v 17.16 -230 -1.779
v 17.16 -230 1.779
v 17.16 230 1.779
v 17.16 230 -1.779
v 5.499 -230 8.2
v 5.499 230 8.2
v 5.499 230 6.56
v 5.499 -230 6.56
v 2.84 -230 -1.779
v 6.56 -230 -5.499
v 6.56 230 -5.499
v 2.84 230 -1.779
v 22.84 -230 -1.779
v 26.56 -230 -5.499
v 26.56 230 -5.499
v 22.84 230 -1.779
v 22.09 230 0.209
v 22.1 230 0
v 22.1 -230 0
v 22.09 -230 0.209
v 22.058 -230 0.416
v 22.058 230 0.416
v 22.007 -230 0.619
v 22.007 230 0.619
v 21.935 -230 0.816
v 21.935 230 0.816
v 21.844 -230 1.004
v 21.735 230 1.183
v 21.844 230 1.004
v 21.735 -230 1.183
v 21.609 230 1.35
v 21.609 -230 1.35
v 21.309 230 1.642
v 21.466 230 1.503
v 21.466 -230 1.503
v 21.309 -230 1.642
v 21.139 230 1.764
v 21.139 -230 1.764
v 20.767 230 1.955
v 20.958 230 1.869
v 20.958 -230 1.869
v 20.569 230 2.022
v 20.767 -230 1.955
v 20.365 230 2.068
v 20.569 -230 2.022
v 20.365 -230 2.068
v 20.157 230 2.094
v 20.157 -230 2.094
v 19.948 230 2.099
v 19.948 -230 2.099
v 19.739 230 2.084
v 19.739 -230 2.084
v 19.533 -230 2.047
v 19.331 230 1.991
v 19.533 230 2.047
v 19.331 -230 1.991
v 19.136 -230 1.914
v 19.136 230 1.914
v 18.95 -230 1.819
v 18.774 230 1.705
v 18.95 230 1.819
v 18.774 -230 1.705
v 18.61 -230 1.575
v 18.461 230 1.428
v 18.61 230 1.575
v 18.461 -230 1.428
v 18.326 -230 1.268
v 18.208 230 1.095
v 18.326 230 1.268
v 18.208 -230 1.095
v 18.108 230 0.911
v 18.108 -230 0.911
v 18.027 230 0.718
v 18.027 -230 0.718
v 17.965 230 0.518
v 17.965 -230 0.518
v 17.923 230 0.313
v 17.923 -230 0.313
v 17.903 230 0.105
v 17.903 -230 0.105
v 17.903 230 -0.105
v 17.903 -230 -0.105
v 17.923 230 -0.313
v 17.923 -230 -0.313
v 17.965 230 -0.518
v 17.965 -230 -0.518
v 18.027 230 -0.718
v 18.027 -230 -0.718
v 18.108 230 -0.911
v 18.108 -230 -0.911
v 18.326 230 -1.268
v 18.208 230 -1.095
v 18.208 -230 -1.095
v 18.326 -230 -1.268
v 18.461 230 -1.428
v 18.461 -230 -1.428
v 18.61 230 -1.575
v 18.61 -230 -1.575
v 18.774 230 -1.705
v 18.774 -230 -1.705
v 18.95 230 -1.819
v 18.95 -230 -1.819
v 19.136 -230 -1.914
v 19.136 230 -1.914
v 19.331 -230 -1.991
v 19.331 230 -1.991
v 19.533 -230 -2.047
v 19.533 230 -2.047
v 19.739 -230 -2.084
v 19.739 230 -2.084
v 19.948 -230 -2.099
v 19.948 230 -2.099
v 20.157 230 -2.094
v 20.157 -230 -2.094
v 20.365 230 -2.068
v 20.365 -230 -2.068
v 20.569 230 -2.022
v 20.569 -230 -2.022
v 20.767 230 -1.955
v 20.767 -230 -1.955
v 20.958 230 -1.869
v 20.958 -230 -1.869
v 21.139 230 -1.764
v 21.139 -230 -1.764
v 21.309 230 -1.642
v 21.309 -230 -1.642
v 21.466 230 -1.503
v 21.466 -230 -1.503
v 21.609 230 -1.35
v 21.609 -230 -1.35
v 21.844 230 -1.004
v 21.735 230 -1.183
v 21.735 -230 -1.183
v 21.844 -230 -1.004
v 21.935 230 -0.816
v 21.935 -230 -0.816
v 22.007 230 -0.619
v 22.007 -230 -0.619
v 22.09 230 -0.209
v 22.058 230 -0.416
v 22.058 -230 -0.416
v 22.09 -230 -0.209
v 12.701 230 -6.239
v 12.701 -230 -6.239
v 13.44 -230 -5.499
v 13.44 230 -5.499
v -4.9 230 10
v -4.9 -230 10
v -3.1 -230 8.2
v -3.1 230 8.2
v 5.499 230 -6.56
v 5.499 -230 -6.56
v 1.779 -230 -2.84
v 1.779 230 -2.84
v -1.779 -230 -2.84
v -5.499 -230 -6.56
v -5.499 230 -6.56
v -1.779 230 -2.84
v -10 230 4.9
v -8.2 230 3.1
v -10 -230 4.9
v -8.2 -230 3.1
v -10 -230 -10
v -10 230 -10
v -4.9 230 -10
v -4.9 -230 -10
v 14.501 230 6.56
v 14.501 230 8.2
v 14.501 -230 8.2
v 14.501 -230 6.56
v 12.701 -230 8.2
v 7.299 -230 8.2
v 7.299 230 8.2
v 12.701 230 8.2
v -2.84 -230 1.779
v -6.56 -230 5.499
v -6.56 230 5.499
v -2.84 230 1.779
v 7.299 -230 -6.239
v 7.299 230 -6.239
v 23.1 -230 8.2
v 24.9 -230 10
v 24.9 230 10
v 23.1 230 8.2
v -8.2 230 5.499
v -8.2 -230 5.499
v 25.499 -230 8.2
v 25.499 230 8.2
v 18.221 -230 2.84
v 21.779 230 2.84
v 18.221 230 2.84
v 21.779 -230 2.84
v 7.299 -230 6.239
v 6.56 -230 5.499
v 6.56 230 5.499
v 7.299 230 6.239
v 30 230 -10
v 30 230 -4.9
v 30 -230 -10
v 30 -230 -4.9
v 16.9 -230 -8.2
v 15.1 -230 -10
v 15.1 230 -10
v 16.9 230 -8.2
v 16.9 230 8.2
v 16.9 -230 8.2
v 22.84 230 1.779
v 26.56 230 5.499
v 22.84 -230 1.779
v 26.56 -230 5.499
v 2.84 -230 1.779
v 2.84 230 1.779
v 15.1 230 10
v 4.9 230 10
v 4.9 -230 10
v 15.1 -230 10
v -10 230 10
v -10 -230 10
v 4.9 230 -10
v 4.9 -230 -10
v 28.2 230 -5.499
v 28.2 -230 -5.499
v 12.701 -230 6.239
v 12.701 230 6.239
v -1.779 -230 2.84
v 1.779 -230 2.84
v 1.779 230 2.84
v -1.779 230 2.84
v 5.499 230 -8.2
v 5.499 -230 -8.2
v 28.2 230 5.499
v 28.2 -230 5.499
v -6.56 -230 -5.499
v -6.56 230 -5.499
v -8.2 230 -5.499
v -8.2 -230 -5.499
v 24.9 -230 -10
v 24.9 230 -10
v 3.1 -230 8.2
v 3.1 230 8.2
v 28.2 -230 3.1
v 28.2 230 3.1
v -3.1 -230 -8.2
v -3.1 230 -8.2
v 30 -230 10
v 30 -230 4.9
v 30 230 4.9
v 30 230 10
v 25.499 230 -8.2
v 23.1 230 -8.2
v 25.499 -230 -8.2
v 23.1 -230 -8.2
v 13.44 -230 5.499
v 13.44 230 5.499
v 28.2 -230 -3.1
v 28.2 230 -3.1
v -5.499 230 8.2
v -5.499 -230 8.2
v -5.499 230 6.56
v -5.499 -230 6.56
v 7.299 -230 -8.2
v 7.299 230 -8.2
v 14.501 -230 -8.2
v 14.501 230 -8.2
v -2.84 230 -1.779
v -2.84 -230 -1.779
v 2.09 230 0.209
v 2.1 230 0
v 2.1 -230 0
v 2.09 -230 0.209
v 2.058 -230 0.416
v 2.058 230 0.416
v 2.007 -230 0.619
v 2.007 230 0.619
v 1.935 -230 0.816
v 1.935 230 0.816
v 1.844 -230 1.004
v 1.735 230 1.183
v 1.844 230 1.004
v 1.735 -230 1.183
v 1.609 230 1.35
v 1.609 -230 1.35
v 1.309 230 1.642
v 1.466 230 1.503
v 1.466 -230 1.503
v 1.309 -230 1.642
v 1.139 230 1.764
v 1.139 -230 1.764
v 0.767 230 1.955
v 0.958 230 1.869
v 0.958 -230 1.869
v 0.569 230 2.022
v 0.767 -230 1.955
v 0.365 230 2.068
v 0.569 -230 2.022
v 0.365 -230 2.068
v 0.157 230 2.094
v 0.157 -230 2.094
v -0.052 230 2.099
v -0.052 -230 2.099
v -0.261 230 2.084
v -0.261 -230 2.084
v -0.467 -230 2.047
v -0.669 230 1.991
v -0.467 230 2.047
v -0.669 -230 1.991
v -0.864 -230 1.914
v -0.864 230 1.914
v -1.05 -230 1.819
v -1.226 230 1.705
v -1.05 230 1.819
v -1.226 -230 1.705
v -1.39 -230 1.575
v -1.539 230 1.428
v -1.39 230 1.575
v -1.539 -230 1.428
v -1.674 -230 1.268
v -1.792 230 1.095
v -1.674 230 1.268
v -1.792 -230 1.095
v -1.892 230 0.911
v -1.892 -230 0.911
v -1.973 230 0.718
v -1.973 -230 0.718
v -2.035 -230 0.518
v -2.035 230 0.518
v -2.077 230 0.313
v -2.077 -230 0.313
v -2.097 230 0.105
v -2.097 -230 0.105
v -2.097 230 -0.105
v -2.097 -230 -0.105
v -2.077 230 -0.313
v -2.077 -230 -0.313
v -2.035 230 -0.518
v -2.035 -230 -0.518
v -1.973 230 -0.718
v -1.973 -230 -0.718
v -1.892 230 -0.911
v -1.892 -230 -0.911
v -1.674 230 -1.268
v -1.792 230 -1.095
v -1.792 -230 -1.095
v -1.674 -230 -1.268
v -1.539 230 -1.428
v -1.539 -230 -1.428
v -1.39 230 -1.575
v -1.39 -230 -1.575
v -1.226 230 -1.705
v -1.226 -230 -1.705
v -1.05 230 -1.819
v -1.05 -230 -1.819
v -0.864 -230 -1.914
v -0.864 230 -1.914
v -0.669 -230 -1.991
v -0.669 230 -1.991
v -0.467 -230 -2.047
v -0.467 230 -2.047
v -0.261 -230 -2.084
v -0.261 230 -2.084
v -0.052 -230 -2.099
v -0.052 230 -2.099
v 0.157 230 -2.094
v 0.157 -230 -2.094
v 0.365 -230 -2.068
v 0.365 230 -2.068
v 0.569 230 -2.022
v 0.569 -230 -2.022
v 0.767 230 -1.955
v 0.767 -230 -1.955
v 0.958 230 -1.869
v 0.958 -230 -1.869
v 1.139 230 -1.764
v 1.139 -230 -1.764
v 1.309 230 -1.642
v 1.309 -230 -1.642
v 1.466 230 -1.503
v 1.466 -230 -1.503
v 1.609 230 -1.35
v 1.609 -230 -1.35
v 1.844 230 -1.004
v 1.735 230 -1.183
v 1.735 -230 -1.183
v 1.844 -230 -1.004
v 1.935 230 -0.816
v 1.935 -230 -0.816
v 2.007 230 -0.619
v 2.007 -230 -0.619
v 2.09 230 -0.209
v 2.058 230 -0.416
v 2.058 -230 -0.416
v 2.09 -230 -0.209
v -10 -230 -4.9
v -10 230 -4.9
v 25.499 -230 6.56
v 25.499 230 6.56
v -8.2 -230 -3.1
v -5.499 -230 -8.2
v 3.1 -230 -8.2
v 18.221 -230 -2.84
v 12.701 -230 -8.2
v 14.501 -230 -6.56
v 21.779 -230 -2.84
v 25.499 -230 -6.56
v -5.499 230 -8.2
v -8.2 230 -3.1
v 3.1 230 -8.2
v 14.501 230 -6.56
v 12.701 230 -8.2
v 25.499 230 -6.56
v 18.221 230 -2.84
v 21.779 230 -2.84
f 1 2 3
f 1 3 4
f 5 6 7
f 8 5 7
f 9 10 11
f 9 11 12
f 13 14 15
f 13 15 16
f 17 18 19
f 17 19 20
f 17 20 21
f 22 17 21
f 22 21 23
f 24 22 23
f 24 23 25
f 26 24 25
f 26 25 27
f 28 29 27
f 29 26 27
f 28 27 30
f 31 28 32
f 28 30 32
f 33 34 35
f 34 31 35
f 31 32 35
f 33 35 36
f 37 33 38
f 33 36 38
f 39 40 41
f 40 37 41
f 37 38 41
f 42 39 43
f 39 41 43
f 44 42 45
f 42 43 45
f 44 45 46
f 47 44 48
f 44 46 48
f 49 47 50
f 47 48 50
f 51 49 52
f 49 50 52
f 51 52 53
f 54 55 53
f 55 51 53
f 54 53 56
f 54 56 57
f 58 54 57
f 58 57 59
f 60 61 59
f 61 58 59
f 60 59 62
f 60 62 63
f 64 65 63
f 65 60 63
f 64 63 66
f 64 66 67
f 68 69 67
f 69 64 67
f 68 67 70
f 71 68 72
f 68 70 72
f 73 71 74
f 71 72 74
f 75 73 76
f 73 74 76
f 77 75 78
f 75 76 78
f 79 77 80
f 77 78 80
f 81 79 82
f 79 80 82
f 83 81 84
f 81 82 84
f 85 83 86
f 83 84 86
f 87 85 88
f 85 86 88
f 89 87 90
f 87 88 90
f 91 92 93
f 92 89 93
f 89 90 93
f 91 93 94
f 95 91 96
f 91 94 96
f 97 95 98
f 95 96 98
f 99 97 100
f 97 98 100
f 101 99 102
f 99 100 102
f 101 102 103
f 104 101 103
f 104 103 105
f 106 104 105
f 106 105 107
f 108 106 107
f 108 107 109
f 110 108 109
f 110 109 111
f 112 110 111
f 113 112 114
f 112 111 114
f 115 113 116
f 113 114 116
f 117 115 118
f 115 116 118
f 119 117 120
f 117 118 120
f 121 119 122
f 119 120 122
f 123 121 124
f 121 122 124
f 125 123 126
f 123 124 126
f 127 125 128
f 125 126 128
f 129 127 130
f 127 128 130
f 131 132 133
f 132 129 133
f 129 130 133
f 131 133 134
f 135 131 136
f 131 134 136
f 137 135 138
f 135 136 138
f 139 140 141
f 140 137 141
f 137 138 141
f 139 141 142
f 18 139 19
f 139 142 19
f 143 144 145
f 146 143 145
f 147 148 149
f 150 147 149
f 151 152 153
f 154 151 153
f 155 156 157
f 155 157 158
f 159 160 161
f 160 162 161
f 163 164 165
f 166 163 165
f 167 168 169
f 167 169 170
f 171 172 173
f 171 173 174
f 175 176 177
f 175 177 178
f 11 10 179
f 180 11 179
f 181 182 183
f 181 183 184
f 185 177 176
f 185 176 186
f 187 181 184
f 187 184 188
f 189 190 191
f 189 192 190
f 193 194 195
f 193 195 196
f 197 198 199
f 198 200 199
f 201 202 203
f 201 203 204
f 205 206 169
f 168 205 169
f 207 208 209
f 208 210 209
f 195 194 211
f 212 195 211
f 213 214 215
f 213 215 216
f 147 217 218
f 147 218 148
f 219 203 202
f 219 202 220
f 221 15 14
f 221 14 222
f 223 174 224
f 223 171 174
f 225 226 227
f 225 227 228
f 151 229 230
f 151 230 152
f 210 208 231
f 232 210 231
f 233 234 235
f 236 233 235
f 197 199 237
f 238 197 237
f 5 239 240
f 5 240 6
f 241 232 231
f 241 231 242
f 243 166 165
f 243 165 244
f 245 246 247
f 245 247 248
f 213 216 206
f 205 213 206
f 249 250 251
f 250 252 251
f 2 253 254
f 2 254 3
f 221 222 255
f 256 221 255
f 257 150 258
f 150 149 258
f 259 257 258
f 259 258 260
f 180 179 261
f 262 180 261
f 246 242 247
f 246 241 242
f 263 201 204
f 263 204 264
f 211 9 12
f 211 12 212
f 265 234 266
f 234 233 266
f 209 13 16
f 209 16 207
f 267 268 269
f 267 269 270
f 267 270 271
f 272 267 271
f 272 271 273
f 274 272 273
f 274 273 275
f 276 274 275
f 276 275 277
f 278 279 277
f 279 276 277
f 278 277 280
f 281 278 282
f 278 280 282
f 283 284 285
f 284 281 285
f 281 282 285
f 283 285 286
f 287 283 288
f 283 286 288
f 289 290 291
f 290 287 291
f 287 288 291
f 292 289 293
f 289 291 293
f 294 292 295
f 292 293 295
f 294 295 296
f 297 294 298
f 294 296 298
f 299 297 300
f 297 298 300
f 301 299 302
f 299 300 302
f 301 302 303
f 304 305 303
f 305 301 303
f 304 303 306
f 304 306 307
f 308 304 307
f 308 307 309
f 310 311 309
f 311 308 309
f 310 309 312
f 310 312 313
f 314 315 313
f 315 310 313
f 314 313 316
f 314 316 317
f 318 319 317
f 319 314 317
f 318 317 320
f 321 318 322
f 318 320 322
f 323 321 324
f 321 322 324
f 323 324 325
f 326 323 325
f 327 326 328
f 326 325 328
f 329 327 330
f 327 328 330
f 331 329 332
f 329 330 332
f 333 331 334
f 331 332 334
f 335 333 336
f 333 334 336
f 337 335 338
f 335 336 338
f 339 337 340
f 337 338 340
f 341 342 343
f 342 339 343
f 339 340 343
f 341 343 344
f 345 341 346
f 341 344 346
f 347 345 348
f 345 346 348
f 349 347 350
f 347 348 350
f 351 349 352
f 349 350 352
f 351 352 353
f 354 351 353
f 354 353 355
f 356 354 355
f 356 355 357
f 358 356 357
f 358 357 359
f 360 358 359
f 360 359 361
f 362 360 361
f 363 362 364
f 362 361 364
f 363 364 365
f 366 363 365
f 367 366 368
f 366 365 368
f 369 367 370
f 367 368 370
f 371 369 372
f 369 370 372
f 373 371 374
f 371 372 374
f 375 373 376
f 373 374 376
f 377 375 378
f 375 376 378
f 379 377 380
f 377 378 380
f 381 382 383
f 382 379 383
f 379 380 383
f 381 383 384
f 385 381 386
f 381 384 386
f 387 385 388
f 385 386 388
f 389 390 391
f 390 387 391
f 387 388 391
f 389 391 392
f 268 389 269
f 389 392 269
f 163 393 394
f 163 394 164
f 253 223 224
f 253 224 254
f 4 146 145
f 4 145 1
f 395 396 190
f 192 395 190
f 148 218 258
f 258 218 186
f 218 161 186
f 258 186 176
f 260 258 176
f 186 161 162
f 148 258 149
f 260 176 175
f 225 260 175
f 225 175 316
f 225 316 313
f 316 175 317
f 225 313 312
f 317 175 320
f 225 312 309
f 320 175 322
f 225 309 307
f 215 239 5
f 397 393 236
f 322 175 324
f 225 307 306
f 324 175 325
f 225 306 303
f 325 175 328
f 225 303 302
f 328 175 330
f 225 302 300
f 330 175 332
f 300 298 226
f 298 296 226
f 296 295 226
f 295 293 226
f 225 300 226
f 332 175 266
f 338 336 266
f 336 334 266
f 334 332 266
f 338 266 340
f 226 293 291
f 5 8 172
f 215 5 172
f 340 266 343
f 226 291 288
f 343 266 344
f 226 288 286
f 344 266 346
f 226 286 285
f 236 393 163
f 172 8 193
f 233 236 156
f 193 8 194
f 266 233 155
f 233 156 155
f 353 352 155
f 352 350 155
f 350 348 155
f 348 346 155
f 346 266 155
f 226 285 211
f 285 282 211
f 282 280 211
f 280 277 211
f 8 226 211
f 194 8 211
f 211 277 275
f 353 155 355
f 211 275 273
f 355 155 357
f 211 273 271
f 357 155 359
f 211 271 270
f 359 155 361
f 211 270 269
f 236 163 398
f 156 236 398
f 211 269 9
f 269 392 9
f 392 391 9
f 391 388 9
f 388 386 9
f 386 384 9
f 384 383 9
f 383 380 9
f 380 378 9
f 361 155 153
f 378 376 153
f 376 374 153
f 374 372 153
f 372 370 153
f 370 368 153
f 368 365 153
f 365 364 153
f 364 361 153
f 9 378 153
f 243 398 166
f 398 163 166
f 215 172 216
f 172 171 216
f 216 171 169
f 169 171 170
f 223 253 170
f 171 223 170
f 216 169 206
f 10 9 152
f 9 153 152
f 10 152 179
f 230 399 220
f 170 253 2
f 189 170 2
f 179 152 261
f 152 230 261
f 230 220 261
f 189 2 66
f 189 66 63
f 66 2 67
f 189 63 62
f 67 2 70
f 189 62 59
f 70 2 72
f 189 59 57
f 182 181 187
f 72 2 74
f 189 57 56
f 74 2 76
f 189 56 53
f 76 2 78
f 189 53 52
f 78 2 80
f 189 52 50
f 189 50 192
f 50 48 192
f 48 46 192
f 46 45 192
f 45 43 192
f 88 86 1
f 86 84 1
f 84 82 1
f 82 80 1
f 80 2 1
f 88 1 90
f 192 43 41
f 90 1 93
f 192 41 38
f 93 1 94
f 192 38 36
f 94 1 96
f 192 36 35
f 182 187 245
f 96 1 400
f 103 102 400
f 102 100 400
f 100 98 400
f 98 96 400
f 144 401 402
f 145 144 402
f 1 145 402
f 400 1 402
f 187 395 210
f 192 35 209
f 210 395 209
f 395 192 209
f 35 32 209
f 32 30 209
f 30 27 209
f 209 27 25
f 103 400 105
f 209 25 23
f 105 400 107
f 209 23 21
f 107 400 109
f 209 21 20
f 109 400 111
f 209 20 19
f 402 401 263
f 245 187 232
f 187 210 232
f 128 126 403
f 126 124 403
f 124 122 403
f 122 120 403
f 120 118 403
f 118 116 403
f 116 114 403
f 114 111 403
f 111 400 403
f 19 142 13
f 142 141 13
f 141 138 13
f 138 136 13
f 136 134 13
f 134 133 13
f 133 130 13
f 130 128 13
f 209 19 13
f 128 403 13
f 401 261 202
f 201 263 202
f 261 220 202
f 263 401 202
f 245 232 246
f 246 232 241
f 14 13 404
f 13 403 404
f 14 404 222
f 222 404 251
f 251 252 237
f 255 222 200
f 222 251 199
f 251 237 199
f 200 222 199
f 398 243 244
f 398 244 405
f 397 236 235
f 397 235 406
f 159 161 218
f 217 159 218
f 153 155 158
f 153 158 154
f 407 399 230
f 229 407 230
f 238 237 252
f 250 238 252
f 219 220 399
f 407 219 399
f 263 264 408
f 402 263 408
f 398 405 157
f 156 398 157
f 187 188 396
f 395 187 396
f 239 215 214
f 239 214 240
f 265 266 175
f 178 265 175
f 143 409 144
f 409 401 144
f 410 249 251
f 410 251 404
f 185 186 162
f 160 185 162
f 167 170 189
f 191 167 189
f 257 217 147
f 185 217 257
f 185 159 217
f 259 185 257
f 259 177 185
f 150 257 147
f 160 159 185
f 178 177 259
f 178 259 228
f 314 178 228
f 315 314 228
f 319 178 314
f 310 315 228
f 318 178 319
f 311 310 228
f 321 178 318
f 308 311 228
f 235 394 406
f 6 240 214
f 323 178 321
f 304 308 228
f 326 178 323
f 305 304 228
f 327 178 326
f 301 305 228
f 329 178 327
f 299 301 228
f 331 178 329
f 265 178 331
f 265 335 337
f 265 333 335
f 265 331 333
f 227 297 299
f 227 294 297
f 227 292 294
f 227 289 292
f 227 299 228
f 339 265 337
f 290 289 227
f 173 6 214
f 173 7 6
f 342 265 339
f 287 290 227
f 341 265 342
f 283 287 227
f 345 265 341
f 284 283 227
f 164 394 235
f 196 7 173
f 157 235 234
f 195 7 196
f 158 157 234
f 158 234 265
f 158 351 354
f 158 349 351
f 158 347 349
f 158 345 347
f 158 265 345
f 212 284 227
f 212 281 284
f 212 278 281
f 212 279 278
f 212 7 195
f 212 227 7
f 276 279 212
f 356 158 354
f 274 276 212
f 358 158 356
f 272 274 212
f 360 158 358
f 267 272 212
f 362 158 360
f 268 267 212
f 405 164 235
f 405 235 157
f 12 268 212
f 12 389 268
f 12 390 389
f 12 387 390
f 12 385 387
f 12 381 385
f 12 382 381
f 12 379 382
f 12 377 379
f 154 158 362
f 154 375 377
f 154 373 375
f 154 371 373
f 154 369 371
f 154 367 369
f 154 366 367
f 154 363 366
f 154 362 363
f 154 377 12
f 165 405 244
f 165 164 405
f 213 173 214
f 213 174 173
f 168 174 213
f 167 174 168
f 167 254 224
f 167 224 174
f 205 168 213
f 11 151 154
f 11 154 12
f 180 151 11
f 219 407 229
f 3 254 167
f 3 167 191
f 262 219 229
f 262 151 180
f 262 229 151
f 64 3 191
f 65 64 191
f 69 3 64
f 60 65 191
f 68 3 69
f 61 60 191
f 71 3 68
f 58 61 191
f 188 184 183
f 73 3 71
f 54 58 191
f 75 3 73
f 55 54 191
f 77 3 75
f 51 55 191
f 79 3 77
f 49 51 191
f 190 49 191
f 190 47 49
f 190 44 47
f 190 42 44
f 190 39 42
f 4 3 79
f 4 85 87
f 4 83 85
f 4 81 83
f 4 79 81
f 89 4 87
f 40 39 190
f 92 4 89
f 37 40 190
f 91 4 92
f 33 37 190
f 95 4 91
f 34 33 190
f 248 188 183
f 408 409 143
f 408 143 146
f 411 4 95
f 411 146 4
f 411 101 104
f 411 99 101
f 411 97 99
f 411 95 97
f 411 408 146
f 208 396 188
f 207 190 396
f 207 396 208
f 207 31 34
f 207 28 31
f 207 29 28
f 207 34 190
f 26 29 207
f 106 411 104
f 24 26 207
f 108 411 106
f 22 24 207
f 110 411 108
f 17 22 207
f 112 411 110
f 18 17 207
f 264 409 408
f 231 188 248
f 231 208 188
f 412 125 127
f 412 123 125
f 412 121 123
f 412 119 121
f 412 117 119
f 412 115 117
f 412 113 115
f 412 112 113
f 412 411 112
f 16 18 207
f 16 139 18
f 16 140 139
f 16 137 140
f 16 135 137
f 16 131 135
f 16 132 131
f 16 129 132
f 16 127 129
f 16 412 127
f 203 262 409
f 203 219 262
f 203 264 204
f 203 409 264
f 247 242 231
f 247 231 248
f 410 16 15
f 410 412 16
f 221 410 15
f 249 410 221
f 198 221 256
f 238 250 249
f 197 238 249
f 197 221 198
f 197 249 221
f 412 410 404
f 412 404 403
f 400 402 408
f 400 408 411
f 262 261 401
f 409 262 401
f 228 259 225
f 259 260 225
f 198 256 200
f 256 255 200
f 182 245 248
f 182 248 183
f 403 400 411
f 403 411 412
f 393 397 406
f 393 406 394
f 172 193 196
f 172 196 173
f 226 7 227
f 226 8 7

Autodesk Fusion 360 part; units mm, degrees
sketch "Sketch1" plane through (0, 0, 0) normal (0, 1, 0) x (1, 0, 0)
  circle A0 centre (0, 0) radius 2.1
  line L0 (-6.56, 5.4993) -> (-8.2, 5.4993)
  line L1 (-8.2, 5.4993) -> (-8.2, 3.1)
  line L2 (-8.2, 3.1) -> (-10, 4.9)
  line L3 (-10, 4.9) -> (-10, 10)
  line L4 (-10, 10) -> (-4.9, 10)
  line L5 (-4.9, 10) -> (-3.1, 8.2)
  line L6 (-3.1, 8.2) -> (-5.4993, 8.2)
  line L7 (-5.4993, 8.2) -> (-5.4993, 6.56)
  line L8 (-5.4993, 6.56) -> (-1.7793, 2.84)
  line L9 (-6.56, 5.4993) -> (-2.84, 1.7793)
  line L10 (0, 0) -> (-10, 10) construction
  line L11 (0, 0) -> (0, 5) construction
  line L12 (0, 0) -> (-5, 0) construction
  line L13 (-2.84, 1.7793) -> (-2.84, 0)
  line L14 (-1.7793, 2.84) -> (0, 2.84)
  line L15 (-8.2, -3.1) -> (-10, -4.9)
  line L16 (-6.56, -5.4993) -> (-8.2, -5.4993)
  line L17 (-10, -4.9) -> (-10, -10)
  line L18 (-4.9, -10) -> (-3.1, -8.2)
  line L19 (-5.4993, -6.56) -> (-1.7793, -2.84)
  line L20 (-6.56, -5.4993) -> (-2.84, -1.7793)
  line L21 (-1.7793, -2.84) -> (0, -2.84)
  line L22 (-3.1, -8.2) -> (-5.4993, -8.2)
  line L23 (-8.2, -5.4993) -> (-8.2, -3.1)
  line L24 (-10, -10) -> (-4.9, -10)
  line L25 (-5.4993, -8.2) -> (-5.4993, -6.56)
  line L26 (-2.84, -1.7793) -> (-2.84, 0)
  line L27 (4.9, 10) -> (3.1, 8.2)
  line L28 (2.84, -1.7793) -> (2.84, 0)
  line L29 (6.56, -5.4993) -> (2.84, -1.7793)
  line L30 (1.7793, 2.84) -> (0, 2.84)
  line L31 (5.4993, -8.2) -> (5.4993, -6.56)
  line L32 (5.4993, -6.56) -> (1.7793, -2.84)
  line L33 (10, 10) -> (4.9, 10)
  line L34 (2.84, 1.7793) -> (2.84, 0)
  line L35 (3.1, 8.2) -> (5.4993, 8.2)
  line L36 (10, -10) -> (4.9, -10)
  line L37 (1.7793, -2.84) -> (0, -2.84)
  line L38 (5.4993, 6.56) -> (1.7793, 2.84)
  line L39 (4.9, -10) -> (3.1, -8.2)
  line L40 (6.56, 5.4993) -> (2.84, 1.7793)
  line L41 (5.4993, 8.2) -> (5.4993, 6.56)
  line L42 (3.1, -8.2) -> (5.4993, -8.2)
  line L43 (10, -4.9) -> (10, 4.9) construction
  line L44 (20, 0) -> (30, 10) construction
  line L45 (26.56, -5.4993) -> (28.2, -5.4993)
  line L46 (23.1, 8.2) -> (25.4993, 8.2)
  line L47 (30, 4.9) -> (30, 10)
  line L48 (26.56, 5.4993) -> (22.84, 1.7793)
  line L49 (22.84, -1.7793) -> (22.84, 0)
  line L50 (30, -4.9) -> (30, -10)
  line L51 (25.4993, -8.2) -> (25.4993, -6.56)
  line L52 (23.1, -8.2) -> (25.4993, -8.2)
  line L53 (28.2, 5.4993) -> (28.2, 3.1)
  line L54 (28.2, 3.1) -> (30, 4.9)
  line L55 (20, 0) -> (20, 5) construction
  line L56 (20, 0) -> (25, 0) construction
  line L57 (30, -10) -> (24.9, -10)
  line L58 (26.56, -5.4993) -> (22.84, -1.7793)
  line L59 (24.9, -10) -> (23.1, -8.2)
  line L60 (25.4993, 8.2) -> (25.4993, 6.56)
  line L61 (28.2, -3.1) -> (30, -4.9)
  line L62 (22.84, 1.7793) -> (22.84, 0)
  line L63 (28.2, -5.4993) -> (28.2, -3.1)
  line L64 (10, -10) -> (15.1, -10)
  line L65 (16.9, 8.2) -> (14.5007, 8.2)
  line L66 (18.2207, 2.84) -> (20, 2.84)
  line L67 (14.5007, -6.56) -> (18.2207, -2.84)
  line L68 (15.1, 10) -> (16.9, 8.2)
  line L69 (13.44, 5.4993) -> (17.16, 1.7793)
  line L70 (18.2207, -2.84) -> (20, -2.84)
  line L71 (17.16, 1.7793) -> (17.16, 0)
  line L72 (15.1, -10) -> (16.9, -8.2)
  line L73 (14.5007, 6.56) -> (18.2207, 2.84)
  line L74 (17.16, -1.7793) -> (17.16, 0)
  line L75 (21.7793, 2.84) -> (20, 2.84)
  line L76 (30, 10) -> (24.9, 10)
  line L77 (26.56, 5.4993) -> (28.2, 5.4993)
  line L78 (24.9, 10) -> (23.1, 8.2)
  line L79 (25.4993, -6.56) -> (21.7793, -2.84)
  line L80 (14.5007, 8.2) -> (14.5007, 6.56)
  line L81 (10, 10) -> (15.1, 10)
  circle A1 centre (20, 0) radius 2.1
  line L82 (14.5007, -8.2) -> (14.5007, -6.56)
  line L83 (21.7793, -2.84) -> (20, -2.84)
  line L84 (16.9, -8.2) -> (14.5007, -8.2)
  line L85 (25.4993, 6.56) -> (21.7793, 2.84)
  line L86 (13.44, -5.4993) -> (17.16, -1.7793)
  line L87 (6.56, 5.4993) -> (7.2993, 6.2387)
  line L88 (7.2993, 6.2387) -> (7.2993, 8.2)
  line L89 (7.2993, 8.2) -> (12.7007, 8.2)
  line L90 (12.7007, 8.2) -> (12.7007, 6.2387)
  line L91 (12.7007, 6.2387) -> (13.44, 5.4993)
  line L92 (6.56, -5.4993) -> (7.2993, -6.2387)
  line L93 (7.2993, -6.2387) -> (7.2993, -8.2)
  line L94 (7.2993, -8.2) -> (12.7007, -8.2)
  line L95 (12.7007, -8.2) -> (12.7007, -6.2387)
  line L96 (12.7007, -6.2387) -> (13.44, -5.4993)
  point P0 (5, 0)
  point P1 (15, 0)
  point P2 (20, 0)
  point P3 (20, 0)
  dimension "d1" = 4.2
  dimension "d2" = 10
  dimension "d3" = 10
  dimension "d4" = 3.1
  dimension "d5" = 1.8
  dimension "d6" = 0
  dimension "d7" = 1.5
  dimension "d8" = 1.64
  dimension "d9" = 135
  dimension "d10" = 0
  dimension "d11" = 2.84
  dimension "d12" = 0
  dimension "d13" = 0
  dimension "d14" = 20
  dimension "d15" = 0
  dimension "d16" = 0
extrude "Extrude1" add sketch "Sketch1" along normal mid plane 460
equation "d4 = ( 6.2 / 2 ) * 1 mm"
equation "d6 = d10"
equation "d10 = d9"
equation "d11 = ( 5.68 / 2 ) * 1 mm"
equation "d12 = d19"
equation "d13 = d13"
equation "d15 = d10"
equation "d16 = d29"
